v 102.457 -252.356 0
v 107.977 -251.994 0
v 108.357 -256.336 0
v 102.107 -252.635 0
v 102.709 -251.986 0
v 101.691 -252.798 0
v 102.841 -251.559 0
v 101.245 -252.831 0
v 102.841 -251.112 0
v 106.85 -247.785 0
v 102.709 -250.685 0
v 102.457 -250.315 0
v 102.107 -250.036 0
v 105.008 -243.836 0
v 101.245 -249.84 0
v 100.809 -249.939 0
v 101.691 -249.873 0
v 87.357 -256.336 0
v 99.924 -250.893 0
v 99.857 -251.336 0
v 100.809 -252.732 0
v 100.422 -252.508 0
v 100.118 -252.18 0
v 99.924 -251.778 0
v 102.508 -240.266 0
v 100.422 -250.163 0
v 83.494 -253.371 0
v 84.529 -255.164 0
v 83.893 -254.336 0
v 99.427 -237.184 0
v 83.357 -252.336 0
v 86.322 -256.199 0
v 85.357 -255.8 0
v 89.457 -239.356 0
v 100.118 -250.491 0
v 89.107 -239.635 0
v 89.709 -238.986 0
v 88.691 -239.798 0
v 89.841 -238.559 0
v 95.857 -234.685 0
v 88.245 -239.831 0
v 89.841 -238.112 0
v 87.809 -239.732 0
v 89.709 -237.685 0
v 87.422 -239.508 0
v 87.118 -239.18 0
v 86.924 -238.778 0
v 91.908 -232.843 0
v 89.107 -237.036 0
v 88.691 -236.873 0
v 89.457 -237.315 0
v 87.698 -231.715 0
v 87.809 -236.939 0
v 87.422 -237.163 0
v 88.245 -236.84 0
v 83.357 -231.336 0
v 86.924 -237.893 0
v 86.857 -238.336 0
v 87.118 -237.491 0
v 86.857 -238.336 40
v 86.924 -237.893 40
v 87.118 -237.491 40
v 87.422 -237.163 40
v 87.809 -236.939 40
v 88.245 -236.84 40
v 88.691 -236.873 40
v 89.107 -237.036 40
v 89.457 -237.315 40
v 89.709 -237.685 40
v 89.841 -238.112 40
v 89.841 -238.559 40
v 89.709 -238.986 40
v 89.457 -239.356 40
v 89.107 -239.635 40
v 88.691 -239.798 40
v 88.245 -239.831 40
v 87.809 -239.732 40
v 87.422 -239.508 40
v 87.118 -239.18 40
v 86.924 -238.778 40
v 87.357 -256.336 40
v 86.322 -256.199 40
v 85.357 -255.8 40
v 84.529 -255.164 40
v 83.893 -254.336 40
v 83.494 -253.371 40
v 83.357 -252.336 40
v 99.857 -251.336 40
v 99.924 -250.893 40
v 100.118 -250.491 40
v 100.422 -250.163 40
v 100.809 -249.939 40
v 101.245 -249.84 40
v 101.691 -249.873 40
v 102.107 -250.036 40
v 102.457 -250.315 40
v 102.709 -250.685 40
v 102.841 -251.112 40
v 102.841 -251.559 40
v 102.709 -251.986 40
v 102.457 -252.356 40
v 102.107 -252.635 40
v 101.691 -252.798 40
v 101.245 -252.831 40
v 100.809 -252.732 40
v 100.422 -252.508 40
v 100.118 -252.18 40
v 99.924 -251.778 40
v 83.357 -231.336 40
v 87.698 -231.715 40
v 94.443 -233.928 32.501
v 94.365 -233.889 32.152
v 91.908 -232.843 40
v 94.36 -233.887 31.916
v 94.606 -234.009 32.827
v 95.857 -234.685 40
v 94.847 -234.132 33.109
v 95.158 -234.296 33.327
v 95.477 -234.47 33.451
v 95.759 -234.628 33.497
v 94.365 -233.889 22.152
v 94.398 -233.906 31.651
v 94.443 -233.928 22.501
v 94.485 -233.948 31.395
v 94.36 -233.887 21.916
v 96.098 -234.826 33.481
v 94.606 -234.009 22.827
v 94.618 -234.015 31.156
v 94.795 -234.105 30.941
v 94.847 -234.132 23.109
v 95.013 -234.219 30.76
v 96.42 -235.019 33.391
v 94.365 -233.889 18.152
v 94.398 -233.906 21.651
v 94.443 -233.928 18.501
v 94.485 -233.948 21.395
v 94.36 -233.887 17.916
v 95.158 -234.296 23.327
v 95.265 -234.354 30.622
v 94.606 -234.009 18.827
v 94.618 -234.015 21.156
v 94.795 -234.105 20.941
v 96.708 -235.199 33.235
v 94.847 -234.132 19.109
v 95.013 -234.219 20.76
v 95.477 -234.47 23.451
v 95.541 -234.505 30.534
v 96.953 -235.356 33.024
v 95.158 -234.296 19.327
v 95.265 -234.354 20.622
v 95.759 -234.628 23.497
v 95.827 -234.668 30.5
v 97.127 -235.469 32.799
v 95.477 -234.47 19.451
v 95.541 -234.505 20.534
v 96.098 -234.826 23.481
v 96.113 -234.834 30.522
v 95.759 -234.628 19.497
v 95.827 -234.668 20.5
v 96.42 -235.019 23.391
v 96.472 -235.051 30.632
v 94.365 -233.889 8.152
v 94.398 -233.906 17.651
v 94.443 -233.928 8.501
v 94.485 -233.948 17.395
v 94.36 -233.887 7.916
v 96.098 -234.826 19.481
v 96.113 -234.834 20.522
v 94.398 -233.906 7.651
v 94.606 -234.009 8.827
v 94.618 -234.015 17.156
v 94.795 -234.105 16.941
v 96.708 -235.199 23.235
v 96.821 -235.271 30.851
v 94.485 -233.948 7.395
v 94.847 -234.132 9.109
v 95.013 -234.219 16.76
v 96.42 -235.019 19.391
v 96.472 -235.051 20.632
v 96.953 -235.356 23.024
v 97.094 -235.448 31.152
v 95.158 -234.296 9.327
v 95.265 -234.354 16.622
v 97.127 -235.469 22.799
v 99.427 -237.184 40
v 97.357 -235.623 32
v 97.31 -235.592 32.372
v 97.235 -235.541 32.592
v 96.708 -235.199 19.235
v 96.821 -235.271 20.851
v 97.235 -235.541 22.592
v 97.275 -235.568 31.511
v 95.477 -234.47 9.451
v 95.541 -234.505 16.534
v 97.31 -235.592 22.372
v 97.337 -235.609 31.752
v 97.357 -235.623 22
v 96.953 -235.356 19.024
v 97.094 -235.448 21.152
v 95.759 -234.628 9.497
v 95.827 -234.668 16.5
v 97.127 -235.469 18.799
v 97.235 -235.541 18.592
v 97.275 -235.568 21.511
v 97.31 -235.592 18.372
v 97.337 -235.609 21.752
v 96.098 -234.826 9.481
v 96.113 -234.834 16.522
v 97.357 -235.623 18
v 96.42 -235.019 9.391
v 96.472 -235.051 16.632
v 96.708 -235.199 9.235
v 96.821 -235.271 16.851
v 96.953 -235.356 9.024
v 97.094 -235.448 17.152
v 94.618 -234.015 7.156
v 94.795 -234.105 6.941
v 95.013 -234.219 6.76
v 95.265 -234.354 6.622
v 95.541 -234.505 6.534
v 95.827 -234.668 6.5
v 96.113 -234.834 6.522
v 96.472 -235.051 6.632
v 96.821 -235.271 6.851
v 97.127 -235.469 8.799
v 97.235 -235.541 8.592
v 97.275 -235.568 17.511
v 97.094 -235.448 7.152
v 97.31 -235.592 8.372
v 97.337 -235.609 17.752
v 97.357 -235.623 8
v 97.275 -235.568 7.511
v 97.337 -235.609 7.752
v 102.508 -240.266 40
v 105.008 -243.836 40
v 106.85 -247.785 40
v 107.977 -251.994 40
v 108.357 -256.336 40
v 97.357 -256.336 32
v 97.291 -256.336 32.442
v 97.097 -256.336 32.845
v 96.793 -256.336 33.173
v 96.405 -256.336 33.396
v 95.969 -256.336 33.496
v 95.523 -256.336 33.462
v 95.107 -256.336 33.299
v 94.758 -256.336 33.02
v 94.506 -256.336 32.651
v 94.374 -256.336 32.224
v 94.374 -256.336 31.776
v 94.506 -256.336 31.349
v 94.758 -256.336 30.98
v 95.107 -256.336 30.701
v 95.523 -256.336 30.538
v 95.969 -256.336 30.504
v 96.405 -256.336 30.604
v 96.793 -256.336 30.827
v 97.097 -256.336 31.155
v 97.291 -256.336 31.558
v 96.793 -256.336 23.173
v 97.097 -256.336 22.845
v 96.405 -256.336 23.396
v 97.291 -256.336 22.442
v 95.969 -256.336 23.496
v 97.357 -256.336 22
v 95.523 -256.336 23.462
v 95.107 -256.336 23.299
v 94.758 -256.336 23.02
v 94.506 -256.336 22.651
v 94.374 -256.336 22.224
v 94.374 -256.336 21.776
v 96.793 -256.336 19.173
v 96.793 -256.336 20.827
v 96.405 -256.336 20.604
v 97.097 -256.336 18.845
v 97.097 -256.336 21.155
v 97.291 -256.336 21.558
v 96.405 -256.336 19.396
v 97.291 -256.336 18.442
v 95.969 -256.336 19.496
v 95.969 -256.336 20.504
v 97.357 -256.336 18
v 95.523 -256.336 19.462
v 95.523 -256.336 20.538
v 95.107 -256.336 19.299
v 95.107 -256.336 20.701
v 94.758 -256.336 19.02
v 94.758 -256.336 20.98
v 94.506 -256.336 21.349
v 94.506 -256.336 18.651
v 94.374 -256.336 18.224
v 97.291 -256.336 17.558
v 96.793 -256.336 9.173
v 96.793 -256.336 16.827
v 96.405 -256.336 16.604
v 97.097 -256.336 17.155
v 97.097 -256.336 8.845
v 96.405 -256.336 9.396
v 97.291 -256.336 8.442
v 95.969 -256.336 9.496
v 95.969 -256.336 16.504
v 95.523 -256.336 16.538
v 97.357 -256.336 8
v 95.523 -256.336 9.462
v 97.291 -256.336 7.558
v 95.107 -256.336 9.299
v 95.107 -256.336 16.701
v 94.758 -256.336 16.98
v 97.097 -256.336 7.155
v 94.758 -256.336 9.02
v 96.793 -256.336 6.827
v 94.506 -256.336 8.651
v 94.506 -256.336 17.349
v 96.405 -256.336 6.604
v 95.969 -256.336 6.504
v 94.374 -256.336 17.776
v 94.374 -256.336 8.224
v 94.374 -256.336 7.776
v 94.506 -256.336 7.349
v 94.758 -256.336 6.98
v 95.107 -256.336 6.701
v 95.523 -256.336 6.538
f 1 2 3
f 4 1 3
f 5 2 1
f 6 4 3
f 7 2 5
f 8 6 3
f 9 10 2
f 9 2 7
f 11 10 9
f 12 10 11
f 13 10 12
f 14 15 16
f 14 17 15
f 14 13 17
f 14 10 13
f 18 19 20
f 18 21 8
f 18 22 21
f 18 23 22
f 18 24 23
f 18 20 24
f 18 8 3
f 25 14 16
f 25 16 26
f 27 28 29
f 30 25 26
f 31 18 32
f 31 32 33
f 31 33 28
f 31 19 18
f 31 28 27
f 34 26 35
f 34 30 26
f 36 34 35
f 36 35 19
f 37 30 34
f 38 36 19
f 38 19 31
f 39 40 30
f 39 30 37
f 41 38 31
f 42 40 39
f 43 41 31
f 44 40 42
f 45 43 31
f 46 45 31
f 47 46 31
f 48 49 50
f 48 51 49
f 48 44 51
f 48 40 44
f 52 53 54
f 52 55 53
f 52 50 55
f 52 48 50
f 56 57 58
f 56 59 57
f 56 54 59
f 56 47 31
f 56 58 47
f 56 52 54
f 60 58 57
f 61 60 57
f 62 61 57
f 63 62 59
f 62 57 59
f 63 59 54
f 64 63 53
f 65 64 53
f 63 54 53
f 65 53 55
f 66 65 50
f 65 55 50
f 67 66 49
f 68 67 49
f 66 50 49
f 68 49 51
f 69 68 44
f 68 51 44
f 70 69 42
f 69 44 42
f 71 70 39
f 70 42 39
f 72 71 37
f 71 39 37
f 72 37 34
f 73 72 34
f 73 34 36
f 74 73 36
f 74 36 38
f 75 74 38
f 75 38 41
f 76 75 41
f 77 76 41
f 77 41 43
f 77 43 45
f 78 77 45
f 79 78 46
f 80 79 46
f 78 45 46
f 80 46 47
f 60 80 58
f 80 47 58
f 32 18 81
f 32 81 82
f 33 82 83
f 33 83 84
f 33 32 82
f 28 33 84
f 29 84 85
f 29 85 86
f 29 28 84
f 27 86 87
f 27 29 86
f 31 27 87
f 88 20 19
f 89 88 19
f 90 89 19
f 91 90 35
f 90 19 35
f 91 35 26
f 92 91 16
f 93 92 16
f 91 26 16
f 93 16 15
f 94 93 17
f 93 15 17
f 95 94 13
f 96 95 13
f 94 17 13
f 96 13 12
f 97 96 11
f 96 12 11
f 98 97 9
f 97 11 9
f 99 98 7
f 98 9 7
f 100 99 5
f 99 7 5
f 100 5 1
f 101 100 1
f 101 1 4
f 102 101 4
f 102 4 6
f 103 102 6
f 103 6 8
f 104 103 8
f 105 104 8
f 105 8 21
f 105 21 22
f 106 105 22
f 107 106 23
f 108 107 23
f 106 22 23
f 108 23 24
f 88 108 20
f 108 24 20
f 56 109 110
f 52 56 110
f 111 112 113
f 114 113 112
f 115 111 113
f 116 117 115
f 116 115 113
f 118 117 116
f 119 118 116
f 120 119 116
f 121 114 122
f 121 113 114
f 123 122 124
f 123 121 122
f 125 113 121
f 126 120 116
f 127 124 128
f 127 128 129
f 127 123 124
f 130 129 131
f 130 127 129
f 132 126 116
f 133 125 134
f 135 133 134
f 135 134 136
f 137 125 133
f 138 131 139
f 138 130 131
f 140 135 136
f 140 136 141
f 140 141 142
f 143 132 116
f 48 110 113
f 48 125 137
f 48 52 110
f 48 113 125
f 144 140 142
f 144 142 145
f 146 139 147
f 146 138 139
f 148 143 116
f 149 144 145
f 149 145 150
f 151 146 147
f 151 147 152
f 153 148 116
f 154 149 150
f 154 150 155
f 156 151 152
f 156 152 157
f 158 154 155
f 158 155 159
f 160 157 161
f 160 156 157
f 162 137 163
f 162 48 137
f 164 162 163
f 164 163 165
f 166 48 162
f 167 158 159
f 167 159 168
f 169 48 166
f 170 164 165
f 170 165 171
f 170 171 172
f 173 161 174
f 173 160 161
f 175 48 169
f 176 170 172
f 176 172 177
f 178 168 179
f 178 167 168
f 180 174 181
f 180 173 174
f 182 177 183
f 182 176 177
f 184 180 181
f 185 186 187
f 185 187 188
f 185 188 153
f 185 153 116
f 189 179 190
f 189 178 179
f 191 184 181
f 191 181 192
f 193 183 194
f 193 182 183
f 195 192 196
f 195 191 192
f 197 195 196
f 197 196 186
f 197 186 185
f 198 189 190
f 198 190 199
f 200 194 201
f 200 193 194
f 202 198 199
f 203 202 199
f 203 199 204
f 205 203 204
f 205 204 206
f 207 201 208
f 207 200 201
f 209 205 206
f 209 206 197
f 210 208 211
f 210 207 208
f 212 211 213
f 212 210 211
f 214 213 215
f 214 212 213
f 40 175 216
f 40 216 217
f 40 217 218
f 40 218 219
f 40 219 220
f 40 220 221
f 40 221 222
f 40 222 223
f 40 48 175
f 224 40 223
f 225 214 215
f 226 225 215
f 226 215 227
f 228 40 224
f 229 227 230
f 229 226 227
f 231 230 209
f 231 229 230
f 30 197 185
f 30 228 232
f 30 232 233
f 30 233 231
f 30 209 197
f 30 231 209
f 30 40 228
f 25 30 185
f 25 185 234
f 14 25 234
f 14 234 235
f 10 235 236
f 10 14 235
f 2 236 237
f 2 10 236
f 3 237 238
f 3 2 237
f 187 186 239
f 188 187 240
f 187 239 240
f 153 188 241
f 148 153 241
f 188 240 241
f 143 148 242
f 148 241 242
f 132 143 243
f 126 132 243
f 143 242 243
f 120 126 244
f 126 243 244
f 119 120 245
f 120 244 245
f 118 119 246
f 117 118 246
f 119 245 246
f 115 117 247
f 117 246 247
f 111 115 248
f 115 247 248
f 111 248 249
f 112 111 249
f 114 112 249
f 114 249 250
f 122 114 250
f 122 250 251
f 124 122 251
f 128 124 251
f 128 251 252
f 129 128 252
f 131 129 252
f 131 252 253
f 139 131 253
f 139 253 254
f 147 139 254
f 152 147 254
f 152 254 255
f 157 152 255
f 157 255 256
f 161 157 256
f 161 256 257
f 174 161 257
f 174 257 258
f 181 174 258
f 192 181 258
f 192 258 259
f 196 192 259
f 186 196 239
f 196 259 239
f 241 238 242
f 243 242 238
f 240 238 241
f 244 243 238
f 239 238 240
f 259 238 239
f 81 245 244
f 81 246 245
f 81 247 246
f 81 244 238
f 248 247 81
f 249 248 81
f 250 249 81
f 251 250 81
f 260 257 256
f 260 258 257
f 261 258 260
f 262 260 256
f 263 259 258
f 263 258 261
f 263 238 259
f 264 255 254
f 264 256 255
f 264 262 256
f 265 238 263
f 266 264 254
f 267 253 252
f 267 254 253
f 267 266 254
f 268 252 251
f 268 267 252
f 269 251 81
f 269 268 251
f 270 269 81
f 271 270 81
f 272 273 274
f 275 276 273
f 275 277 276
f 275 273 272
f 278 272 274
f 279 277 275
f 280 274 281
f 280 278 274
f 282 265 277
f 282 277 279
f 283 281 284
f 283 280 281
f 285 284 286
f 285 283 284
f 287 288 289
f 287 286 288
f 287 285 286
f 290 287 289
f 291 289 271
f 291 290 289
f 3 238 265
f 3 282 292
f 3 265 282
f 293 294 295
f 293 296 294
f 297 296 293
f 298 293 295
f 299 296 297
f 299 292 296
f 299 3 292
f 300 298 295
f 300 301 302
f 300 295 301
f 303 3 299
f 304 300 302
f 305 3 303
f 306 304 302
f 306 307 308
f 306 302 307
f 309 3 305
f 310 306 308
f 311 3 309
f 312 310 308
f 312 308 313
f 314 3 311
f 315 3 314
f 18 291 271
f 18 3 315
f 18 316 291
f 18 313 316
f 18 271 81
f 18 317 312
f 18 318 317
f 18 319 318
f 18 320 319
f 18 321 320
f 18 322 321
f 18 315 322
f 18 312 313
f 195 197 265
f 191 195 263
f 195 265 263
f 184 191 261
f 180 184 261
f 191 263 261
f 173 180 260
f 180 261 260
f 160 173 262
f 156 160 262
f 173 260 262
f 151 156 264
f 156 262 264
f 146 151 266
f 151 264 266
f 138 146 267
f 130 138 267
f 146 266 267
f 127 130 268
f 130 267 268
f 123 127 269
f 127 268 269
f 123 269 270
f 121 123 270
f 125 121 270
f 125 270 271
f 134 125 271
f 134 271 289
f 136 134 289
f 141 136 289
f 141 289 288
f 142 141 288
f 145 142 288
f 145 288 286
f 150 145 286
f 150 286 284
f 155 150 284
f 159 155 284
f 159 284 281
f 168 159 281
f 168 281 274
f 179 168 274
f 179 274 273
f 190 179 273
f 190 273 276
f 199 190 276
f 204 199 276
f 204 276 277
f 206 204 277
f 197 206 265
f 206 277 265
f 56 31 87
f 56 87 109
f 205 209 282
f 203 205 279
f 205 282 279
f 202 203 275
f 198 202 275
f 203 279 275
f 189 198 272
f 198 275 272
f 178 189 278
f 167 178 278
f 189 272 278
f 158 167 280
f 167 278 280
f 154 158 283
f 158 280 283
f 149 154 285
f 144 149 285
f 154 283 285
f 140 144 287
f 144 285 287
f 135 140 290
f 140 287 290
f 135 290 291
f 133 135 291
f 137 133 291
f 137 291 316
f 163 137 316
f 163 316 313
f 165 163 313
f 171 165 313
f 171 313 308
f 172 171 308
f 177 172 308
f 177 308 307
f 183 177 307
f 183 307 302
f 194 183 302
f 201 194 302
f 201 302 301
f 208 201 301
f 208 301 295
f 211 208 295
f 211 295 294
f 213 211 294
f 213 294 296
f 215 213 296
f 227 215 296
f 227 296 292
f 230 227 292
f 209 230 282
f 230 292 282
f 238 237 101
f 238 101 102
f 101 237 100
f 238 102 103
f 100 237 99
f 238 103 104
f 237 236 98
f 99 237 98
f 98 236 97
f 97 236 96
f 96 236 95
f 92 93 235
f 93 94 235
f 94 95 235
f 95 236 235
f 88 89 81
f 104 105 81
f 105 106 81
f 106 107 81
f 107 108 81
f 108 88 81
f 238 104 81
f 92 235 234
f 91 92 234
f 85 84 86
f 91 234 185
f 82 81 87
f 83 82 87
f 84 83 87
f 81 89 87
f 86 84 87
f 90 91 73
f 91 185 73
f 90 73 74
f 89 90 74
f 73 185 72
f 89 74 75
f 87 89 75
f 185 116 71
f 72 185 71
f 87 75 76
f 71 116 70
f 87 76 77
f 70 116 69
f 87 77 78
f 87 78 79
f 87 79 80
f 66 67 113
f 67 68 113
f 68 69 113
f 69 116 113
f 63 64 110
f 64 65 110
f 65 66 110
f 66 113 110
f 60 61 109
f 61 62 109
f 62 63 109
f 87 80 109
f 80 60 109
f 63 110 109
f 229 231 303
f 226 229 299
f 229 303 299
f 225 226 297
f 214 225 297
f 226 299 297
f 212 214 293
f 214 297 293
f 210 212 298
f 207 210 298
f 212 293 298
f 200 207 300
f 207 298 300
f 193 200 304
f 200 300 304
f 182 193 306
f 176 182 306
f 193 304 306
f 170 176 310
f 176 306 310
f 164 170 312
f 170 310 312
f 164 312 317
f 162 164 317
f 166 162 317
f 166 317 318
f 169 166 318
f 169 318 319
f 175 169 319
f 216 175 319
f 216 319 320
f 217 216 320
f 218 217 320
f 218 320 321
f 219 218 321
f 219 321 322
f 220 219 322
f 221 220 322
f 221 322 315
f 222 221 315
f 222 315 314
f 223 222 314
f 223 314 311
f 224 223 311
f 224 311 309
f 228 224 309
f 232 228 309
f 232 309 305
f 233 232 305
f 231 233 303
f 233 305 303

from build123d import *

# Parameters (mm, degrees)
RESSALTO_EXTRUS_O3_DEPTH = 40
ESBO_O8_R                = 1.5
CORTE_EXTRUS_O1_DEPTH    = 40
ESBO_O9_R                = 1.5
CORTE_EXTRUS_O2_DEPTH    = 26


with BuildPart() as part:
    # Esboço7 → Ressalto-extrusão3 (new body)
    with BuildSketch(Plane.XY):
        with BuildLine():
            Line((103.35727616, -256.335501283), (87.35727616, -256.335501283))
            ThreePointArc((87.35727616, -256.335501283), (84.528849035, -255.163928408), (83.35727616, -252.335501283))
            Line((83.35727616, -252.335501283), (83.35727616, -236.335501283))
            Line((83.35727616, -236.335501283), (83.35727616, -231.335501283))
            ThreePointArc((83.35727616, -231.335501283), (101.034945689, -238.657831753), (108.35727616, -256.335501283))
            Line((108.35727616, -256.335501283), (103.35727616, -256.335501283))
        make_face()
    extrude(amount=RESSALTO_EXTRUS_O3_DEPTH)

    # Esboço8 → Corte-extrusão1 (cut)
    with BuildSketch(Plane(origin=(0, 0, 0), x_dir=(-1, 0, 0), z_dir=(0, 0, -1))):
        with Locations((-88.35727616, -238.335501283)):
            Circle(ESBO_O8_R)
        with Locations((-101.35727616, -251.335501283)):
            Circle(ESBO_O8_R)
    extrude(amount=-CORTE_EXTRUS_O1_DEPTH, mode=Mode.SUBTRACT)

    # Esboço9 → Corte-extrusão2 (cut, through all)
    with BuildSketch(Plane.XZ.offset(256.335501283)):
        with Locations((95.85727616, 8)):
            Circle(ESBO_O9_R)
        with Locations((95.85727616, 18)):
            Circle(ESBO_O9_R)
        with Locations((95.85727616, 22)):
            Circle(ESBO_O9_R)
        with Locations((95.85727616, 32)):
            Circle(ESBO_O9_R)
    extrude(amount=-CORTE_EXTRUS_O2_DEPTH, mode=Mode.SUBTRACT)


solid = part.part
